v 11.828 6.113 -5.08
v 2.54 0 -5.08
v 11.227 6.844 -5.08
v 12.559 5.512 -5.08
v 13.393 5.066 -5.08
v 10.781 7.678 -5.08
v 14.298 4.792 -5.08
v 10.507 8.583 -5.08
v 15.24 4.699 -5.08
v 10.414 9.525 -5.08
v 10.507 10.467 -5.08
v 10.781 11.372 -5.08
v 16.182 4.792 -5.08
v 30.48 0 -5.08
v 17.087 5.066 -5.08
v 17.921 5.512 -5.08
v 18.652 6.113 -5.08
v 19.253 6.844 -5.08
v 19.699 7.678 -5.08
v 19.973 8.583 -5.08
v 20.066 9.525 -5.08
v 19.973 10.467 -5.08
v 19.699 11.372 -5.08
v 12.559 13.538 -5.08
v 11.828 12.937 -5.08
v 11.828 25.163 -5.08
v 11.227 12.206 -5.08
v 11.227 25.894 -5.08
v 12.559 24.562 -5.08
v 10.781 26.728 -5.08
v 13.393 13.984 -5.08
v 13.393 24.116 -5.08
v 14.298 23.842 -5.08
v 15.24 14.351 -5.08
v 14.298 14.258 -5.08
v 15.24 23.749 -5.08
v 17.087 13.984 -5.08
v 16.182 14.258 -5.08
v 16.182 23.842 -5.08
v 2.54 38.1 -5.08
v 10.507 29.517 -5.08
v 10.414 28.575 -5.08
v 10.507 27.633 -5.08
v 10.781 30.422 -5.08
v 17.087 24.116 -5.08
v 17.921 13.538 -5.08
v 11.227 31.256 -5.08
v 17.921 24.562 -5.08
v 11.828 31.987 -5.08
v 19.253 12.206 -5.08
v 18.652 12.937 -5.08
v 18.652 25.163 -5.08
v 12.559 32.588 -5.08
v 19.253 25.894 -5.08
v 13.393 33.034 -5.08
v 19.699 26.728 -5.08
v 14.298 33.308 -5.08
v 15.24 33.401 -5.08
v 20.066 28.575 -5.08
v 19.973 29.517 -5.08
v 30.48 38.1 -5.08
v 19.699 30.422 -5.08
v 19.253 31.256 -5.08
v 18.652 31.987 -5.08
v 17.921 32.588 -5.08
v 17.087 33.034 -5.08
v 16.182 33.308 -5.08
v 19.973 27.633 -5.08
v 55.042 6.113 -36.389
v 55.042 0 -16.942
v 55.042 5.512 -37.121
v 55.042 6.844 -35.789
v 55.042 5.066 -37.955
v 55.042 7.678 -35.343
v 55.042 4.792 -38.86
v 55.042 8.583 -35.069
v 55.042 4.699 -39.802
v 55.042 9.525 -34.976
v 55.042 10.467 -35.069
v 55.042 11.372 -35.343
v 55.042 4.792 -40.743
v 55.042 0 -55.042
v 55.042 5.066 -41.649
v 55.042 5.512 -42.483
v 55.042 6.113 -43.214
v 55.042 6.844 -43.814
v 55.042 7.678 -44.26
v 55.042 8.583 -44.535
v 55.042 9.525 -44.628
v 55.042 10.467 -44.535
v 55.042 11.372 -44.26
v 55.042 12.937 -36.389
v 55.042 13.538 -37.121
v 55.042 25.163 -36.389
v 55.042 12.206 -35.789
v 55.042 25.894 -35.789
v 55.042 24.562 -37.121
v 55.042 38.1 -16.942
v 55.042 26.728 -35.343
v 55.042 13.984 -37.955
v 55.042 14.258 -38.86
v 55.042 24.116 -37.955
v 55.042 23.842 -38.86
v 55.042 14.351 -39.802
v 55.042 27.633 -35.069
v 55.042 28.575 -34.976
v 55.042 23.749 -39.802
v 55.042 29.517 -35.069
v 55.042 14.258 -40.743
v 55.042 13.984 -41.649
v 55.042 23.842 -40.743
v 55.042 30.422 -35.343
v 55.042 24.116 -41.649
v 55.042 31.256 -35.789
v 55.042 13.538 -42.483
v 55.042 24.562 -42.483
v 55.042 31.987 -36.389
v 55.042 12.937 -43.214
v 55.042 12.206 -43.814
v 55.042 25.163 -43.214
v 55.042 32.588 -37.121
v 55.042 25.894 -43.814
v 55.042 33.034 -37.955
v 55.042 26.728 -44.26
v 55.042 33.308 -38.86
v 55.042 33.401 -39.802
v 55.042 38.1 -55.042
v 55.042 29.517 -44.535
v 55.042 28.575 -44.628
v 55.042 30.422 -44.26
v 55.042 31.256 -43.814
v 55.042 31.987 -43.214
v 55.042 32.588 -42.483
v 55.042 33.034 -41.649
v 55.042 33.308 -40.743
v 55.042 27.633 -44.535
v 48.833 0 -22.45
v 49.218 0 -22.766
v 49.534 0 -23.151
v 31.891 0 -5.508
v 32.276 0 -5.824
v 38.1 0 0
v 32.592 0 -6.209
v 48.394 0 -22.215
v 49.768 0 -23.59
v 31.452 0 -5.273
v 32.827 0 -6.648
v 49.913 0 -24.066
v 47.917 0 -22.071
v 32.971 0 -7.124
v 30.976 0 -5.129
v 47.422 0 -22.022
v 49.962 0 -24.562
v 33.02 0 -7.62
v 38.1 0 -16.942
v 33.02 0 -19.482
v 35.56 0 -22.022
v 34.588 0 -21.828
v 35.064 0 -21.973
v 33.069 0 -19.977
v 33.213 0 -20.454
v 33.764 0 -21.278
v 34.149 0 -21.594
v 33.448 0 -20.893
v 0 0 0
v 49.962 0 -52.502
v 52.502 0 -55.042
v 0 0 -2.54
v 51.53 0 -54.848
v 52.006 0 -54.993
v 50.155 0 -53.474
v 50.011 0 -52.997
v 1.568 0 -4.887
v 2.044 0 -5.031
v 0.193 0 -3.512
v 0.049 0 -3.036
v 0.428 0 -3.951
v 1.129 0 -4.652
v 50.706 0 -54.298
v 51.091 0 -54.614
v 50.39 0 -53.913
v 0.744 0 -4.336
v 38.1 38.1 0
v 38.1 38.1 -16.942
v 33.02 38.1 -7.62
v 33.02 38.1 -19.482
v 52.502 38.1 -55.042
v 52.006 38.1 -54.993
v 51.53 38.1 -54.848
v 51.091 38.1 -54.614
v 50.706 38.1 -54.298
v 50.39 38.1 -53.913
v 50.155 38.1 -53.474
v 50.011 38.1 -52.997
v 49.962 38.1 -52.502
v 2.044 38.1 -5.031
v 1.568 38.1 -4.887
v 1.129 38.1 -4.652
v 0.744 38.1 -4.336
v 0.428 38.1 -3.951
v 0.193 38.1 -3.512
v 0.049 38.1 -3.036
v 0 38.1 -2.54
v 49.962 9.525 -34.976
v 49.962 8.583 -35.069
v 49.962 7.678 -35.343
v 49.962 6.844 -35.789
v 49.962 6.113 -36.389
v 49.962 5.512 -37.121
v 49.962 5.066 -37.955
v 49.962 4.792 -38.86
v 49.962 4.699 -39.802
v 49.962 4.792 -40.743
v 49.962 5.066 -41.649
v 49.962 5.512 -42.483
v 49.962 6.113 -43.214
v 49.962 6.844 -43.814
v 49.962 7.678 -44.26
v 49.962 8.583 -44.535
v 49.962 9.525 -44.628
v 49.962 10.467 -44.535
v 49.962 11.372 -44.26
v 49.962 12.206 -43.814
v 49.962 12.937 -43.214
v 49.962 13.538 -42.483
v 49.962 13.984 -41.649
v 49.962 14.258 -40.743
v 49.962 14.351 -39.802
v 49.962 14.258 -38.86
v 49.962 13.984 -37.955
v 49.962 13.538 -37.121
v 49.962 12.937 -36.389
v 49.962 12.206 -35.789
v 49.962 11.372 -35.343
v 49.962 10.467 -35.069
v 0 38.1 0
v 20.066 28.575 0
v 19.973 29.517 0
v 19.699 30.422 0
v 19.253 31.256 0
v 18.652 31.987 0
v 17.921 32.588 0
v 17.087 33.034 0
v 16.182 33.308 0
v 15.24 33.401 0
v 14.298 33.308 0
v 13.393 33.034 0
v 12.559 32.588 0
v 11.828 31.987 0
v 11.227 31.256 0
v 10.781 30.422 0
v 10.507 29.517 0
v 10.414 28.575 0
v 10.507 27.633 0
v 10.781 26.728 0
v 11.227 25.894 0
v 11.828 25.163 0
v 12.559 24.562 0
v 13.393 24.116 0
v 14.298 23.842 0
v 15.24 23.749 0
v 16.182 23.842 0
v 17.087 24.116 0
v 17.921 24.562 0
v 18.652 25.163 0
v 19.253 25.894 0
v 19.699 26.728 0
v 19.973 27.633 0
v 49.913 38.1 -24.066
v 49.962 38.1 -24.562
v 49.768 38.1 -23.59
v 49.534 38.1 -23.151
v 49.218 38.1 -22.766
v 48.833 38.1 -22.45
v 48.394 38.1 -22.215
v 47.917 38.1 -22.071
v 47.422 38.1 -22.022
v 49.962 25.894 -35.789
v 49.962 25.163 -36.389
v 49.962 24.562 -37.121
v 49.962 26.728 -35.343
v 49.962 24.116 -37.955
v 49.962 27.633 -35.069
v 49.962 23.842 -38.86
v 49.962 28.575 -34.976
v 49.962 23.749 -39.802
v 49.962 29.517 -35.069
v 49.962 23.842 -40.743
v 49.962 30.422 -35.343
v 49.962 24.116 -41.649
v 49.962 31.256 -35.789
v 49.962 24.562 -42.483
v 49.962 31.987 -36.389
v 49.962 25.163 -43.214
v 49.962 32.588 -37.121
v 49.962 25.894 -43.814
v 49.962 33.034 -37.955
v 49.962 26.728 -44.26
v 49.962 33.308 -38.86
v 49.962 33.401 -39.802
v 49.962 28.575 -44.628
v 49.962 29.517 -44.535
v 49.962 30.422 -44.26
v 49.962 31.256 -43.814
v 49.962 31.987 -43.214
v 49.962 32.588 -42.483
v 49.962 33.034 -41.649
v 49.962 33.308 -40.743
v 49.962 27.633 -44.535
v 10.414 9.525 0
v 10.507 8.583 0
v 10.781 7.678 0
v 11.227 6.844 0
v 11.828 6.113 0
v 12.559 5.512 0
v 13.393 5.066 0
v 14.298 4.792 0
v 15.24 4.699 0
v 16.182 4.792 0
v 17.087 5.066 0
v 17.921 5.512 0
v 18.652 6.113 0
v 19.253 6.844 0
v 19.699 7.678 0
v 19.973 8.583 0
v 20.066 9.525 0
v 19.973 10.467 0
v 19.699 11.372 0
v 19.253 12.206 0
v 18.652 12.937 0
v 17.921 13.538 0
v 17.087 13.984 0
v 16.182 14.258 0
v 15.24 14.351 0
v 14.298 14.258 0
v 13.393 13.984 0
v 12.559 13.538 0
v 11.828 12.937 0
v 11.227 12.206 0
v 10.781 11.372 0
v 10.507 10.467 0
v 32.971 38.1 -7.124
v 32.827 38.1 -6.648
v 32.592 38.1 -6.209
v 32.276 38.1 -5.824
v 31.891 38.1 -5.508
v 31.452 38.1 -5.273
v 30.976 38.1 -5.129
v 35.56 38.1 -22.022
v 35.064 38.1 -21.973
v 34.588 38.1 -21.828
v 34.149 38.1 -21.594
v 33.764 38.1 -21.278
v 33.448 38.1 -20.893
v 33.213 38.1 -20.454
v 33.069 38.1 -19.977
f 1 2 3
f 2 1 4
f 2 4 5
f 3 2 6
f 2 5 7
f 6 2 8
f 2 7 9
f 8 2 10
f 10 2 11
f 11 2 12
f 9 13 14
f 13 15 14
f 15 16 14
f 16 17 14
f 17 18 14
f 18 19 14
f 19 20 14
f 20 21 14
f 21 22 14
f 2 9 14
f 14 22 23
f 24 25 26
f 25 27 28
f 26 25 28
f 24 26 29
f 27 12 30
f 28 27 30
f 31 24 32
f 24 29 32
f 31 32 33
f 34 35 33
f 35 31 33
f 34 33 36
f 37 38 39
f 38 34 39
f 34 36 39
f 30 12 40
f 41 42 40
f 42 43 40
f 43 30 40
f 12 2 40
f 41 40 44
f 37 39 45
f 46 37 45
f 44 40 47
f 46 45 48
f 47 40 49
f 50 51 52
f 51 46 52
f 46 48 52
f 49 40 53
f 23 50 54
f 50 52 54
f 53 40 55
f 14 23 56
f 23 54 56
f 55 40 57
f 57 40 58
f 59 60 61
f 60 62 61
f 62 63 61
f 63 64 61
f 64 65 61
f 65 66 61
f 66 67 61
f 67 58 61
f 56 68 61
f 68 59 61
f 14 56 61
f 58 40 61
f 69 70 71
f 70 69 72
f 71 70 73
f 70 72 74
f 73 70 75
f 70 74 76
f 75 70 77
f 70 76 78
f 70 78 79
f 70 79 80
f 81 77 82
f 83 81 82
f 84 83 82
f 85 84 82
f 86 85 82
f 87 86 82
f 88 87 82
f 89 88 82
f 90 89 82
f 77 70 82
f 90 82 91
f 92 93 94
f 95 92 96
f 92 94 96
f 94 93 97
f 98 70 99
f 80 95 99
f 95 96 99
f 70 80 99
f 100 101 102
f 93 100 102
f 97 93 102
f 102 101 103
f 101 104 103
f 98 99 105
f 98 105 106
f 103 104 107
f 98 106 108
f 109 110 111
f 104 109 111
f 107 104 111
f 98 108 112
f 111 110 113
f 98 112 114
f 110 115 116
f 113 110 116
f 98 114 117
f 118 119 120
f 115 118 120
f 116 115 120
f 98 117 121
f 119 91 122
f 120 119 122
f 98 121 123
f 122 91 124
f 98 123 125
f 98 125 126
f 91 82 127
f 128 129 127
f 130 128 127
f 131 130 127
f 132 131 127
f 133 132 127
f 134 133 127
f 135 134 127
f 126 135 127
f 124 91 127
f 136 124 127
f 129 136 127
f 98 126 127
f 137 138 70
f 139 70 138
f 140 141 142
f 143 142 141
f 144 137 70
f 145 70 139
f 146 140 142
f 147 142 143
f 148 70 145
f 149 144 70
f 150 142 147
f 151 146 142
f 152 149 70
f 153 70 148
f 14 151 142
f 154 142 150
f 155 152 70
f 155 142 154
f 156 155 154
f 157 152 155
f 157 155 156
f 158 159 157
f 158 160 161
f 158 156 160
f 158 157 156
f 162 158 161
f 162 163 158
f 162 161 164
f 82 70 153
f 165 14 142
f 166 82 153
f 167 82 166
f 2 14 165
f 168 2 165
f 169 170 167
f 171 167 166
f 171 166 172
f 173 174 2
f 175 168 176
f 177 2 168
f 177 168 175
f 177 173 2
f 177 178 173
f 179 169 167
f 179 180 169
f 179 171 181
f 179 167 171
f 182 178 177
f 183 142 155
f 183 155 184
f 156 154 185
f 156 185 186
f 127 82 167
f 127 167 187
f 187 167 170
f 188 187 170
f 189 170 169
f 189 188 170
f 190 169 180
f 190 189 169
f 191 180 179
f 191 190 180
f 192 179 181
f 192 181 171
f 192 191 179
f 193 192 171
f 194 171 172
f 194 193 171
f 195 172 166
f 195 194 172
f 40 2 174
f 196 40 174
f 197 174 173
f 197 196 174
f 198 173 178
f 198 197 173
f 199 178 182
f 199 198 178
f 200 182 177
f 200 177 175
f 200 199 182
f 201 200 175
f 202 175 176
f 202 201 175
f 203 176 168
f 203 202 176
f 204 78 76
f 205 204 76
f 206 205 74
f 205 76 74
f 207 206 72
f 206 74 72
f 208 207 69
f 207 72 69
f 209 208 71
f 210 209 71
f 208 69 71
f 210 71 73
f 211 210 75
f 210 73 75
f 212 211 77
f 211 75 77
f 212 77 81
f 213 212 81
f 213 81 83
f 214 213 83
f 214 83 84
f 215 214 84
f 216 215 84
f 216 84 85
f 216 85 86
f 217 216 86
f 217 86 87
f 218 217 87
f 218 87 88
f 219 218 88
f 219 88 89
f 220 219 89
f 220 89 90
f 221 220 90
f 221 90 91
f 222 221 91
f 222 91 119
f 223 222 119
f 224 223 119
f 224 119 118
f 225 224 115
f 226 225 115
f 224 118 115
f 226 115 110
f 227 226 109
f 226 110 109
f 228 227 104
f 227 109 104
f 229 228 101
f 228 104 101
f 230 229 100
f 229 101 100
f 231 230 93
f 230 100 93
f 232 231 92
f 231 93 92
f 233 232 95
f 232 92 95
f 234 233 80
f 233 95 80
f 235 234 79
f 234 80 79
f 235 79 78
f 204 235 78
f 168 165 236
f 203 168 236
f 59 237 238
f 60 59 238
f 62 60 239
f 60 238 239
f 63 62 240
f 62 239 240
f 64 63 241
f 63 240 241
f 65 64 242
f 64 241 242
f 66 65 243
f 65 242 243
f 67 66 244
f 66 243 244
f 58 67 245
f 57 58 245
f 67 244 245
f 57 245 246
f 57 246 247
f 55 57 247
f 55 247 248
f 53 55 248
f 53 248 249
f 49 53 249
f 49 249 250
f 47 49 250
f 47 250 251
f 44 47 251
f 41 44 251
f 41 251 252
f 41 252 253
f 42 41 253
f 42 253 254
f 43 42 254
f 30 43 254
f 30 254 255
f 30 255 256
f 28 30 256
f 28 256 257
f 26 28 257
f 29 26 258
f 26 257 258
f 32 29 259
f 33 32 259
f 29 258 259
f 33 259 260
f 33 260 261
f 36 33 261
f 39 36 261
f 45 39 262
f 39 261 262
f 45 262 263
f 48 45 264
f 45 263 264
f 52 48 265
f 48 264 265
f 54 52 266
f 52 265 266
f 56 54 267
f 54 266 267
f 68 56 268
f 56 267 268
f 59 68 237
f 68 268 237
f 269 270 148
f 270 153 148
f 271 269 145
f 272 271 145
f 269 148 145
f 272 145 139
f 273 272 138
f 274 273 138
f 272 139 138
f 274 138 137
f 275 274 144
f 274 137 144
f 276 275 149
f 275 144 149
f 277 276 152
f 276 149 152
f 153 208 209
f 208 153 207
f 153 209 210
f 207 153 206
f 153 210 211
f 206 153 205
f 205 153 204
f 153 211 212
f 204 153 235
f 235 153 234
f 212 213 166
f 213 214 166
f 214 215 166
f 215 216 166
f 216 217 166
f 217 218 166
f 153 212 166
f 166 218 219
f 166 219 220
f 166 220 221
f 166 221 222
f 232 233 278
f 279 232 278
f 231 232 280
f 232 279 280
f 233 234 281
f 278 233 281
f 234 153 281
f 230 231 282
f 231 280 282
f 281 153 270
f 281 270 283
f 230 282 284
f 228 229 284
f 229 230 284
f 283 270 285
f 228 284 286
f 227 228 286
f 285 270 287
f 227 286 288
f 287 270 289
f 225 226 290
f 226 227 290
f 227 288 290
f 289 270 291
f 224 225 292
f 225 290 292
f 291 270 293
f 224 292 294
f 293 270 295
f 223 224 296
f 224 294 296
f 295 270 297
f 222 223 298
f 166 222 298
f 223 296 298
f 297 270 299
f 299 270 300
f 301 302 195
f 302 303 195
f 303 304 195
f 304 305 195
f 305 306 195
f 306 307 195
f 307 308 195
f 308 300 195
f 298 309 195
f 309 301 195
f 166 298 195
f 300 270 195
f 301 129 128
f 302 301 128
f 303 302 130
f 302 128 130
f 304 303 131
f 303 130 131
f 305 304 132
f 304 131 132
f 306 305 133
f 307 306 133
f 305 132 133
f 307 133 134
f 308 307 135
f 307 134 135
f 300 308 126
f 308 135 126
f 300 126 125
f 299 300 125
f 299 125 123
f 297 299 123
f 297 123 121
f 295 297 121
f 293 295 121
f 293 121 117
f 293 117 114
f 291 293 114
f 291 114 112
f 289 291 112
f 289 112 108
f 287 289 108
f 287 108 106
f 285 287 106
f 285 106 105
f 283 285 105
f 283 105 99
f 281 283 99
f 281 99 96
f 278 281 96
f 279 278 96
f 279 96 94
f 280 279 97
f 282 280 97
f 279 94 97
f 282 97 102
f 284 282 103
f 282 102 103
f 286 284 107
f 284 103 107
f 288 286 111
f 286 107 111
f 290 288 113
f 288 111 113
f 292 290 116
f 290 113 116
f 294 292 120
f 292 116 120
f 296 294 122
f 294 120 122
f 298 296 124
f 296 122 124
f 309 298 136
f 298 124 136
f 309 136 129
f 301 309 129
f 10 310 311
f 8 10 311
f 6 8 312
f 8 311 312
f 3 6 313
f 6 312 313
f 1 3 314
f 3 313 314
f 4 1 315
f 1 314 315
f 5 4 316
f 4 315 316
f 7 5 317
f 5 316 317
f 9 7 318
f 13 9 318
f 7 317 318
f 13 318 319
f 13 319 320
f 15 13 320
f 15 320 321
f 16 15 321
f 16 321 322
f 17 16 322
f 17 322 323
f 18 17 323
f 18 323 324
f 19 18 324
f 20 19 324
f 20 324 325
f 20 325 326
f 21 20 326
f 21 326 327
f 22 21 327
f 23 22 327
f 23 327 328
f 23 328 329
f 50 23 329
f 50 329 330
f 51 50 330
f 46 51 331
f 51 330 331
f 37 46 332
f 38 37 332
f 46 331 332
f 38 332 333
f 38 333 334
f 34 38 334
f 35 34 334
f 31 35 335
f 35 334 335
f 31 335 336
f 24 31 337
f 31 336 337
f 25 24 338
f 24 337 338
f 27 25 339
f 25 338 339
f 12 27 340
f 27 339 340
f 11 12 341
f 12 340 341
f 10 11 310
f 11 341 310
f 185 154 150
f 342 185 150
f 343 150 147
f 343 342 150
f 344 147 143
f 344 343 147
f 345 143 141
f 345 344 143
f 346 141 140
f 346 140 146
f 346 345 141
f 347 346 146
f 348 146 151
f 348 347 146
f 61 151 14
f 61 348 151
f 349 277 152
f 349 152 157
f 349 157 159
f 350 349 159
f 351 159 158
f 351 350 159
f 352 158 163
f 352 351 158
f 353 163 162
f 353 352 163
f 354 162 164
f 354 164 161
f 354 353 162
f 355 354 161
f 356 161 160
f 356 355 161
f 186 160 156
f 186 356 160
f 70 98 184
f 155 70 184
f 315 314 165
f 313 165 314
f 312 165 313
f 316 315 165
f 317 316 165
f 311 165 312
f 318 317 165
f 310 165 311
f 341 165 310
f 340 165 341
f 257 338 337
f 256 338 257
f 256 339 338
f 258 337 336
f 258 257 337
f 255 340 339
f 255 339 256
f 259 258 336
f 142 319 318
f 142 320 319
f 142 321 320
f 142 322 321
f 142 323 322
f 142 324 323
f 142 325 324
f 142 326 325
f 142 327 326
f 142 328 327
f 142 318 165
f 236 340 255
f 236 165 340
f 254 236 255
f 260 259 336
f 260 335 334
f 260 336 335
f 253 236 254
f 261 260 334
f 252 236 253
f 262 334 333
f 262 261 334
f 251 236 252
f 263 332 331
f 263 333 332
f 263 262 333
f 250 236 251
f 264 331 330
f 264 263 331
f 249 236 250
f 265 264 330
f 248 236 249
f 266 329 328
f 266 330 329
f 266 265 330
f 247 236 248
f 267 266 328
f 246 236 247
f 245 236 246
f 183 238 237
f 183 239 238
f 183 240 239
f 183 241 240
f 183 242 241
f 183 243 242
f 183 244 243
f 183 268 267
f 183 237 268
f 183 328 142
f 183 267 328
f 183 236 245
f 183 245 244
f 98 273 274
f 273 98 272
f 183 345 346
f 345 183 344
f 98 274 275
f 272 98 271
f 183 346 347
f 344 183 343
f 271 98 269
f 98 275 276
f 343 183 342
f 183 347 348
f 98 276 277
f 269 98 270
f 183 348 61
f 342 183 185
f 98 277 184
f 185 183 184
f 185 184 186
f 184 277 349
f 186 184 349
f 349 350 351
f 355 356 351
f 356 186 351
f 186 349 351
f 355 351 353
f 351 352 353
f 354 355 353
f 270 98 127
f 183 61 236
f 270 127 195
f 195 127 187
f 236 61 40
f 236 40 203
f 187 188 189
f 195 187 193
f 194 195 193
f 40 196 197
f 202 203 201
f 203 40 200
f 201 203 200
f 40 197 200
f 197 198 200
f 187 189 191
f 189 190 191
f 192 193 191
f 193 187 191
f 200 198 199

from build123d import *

# Parameters (mm, degrees)
SKETCH2_W           = 38.1
SKETCH2_H           = 38.1
BOSS_EXTRUDE1_DEPTH = 5.08
SKETCH3_W           = 22.0218
SKETCH3_H           = 38.1
BOSS_EXTRUDE2_DEPTH = 5.08
SKETCH4_W           = 22.0218
SKETCH4_H           = 38.1
BOSS_EXTRUDE3_DEPTH = 5.08
SKETCH5_W           = 38.1
SKETCH5_H           = 38.1
BOSS_EXTRUDE4_DEPTH = 5.08
SKETCH6_R           = 4.826
CUT_EXTRUDE1_DEPTH  = 87.664926553
SKETCH7_R           = 4.826
CUT_EXTRUDE2_DEPTH  = 87.664926553
FILLET1_R           = 2.54
FILLET2_R           = 2.54
FILLET3_R           = 2.54
FILLET4_R           = 2.54
FILLET5_R           = 2.54


with BuildPart() as part:
    # Sketch2 → Boss-Extrude1 (new body)
    with BuildSketch(Plane.XY):
        with Locations((19.05, 19.05)):
            Rectangle(SKETCH2_W, SKETCH2_H)
    extrude(amount=-BOSS_EXTRUDE1_DEPTH)

    # Sketch3 → Boss-Extrude2 (add)
    with BuildSketch(Plane(origin=(38.1, 0, 0), x_dir=(0, 0, -1), z_dir=(1, 0, 0))):
        with Locations((11.0109, 19.05)):
            Rectangle(SKETCH3_W, SKETCH3_H)
    extrude(amount=-BOSS_EXTRUDE2_DEPTH)

    # Sketch4 → Boss-Extrude3 (add)
    with BuildSketch(Plane(origin=(0, 0, -22.0218), x_dir=(-1, 0, 0), z_dir=(0, 0, -1))):
        with Locations((-44.0309, 19.05)):
            Rectangle(SKETCH4_W, SKETCH4_H)
    extrude(amount=-BOSS_EXTRUDE3_DEPTH)

    # Sketch5 → Boss-Extrude4 (add)
    with BuildSketch(Plane(origin=(55.0418, 0, 0), x_dir=(0, 0, -1), z_dir=(1, 0, 0))):
        with Locations((35.9918, 19.05)):
            Rectangle(SKETCH5_W, SKETCH5_H)
    extrude(amount=-BOSS_EXTRUDE4_DEPTH)

    # Sketch6 → Cut-Extrude1 (cut, through all)
    with BuildSketch(Plane(origin=(55.0418, 0, 0), x_dir=(0, 0, -1), z_dir=(1, 0, 0))):
        with Locations((39.8018, 28.575)):
            Circle(SKETCH6_R)
        with Locations(Location((39.8018, 9.525, 0), (0, 0, 180))):
            Circle(SKETCH6_R)
    extrude(amount=-CUT_EXTRUDE1_DEPTH, mode=Mode.SUBTRACT)

    # Sketch7 → Cut-Extrude2 (cut, through all)
    with BuildSketch(Plane.XY):
        with Locations((15.24, 28.575)):
            Circle(SKETCH7_R)
        with Locations(Location((15.24, 9.525, 0), (0, 0, 180))):
            Circle(SKETCH7_R)
    extrude(amount=-CUT_EXTRUDE2_DEPTH, mode=Mode.SUBTRACT)

    # Fillet1
    fillet1_edges = [part.edges().sort_by_distance(p)[0] for p in [
        (49.9618, 19.05, -55.0418),
    ]]
    fillet(fillet1_edges, radius=FILLET1_R)

    # Fillet2
    fillet2_edges = [part.edges().sort_by_distance(p)[0] for p in [
        (49.9618, 19.05, -22.0218),
    ]]
    fillet(fillet2_edges, radius=FILLET2_R)

    # Fillet3
    fillet3_edges = [part.edges().sort_by_distance(p)[0] for p in [
        (33.02, 19.05, -22.0218),
    ]]
    fillet(fillet3_edges, radius=FILLET3_R)

    # Fillet4
    fillet4_edges = [part.edges().sort_by_distance(p)[0] for p in [
        (33.02, 19.05, -5.08),
    ]]
    fillet(fillet4_edges, radius=FILLET4_R)

    # Fillet5
    fillet5_edges = [part.edges().sort_by_distance(p)[0] for p in [
        (0, 19.05, -5.08),
    ]]
    fillet(fillet5_edges, radius=FILLET5_R)


solid = part.part
